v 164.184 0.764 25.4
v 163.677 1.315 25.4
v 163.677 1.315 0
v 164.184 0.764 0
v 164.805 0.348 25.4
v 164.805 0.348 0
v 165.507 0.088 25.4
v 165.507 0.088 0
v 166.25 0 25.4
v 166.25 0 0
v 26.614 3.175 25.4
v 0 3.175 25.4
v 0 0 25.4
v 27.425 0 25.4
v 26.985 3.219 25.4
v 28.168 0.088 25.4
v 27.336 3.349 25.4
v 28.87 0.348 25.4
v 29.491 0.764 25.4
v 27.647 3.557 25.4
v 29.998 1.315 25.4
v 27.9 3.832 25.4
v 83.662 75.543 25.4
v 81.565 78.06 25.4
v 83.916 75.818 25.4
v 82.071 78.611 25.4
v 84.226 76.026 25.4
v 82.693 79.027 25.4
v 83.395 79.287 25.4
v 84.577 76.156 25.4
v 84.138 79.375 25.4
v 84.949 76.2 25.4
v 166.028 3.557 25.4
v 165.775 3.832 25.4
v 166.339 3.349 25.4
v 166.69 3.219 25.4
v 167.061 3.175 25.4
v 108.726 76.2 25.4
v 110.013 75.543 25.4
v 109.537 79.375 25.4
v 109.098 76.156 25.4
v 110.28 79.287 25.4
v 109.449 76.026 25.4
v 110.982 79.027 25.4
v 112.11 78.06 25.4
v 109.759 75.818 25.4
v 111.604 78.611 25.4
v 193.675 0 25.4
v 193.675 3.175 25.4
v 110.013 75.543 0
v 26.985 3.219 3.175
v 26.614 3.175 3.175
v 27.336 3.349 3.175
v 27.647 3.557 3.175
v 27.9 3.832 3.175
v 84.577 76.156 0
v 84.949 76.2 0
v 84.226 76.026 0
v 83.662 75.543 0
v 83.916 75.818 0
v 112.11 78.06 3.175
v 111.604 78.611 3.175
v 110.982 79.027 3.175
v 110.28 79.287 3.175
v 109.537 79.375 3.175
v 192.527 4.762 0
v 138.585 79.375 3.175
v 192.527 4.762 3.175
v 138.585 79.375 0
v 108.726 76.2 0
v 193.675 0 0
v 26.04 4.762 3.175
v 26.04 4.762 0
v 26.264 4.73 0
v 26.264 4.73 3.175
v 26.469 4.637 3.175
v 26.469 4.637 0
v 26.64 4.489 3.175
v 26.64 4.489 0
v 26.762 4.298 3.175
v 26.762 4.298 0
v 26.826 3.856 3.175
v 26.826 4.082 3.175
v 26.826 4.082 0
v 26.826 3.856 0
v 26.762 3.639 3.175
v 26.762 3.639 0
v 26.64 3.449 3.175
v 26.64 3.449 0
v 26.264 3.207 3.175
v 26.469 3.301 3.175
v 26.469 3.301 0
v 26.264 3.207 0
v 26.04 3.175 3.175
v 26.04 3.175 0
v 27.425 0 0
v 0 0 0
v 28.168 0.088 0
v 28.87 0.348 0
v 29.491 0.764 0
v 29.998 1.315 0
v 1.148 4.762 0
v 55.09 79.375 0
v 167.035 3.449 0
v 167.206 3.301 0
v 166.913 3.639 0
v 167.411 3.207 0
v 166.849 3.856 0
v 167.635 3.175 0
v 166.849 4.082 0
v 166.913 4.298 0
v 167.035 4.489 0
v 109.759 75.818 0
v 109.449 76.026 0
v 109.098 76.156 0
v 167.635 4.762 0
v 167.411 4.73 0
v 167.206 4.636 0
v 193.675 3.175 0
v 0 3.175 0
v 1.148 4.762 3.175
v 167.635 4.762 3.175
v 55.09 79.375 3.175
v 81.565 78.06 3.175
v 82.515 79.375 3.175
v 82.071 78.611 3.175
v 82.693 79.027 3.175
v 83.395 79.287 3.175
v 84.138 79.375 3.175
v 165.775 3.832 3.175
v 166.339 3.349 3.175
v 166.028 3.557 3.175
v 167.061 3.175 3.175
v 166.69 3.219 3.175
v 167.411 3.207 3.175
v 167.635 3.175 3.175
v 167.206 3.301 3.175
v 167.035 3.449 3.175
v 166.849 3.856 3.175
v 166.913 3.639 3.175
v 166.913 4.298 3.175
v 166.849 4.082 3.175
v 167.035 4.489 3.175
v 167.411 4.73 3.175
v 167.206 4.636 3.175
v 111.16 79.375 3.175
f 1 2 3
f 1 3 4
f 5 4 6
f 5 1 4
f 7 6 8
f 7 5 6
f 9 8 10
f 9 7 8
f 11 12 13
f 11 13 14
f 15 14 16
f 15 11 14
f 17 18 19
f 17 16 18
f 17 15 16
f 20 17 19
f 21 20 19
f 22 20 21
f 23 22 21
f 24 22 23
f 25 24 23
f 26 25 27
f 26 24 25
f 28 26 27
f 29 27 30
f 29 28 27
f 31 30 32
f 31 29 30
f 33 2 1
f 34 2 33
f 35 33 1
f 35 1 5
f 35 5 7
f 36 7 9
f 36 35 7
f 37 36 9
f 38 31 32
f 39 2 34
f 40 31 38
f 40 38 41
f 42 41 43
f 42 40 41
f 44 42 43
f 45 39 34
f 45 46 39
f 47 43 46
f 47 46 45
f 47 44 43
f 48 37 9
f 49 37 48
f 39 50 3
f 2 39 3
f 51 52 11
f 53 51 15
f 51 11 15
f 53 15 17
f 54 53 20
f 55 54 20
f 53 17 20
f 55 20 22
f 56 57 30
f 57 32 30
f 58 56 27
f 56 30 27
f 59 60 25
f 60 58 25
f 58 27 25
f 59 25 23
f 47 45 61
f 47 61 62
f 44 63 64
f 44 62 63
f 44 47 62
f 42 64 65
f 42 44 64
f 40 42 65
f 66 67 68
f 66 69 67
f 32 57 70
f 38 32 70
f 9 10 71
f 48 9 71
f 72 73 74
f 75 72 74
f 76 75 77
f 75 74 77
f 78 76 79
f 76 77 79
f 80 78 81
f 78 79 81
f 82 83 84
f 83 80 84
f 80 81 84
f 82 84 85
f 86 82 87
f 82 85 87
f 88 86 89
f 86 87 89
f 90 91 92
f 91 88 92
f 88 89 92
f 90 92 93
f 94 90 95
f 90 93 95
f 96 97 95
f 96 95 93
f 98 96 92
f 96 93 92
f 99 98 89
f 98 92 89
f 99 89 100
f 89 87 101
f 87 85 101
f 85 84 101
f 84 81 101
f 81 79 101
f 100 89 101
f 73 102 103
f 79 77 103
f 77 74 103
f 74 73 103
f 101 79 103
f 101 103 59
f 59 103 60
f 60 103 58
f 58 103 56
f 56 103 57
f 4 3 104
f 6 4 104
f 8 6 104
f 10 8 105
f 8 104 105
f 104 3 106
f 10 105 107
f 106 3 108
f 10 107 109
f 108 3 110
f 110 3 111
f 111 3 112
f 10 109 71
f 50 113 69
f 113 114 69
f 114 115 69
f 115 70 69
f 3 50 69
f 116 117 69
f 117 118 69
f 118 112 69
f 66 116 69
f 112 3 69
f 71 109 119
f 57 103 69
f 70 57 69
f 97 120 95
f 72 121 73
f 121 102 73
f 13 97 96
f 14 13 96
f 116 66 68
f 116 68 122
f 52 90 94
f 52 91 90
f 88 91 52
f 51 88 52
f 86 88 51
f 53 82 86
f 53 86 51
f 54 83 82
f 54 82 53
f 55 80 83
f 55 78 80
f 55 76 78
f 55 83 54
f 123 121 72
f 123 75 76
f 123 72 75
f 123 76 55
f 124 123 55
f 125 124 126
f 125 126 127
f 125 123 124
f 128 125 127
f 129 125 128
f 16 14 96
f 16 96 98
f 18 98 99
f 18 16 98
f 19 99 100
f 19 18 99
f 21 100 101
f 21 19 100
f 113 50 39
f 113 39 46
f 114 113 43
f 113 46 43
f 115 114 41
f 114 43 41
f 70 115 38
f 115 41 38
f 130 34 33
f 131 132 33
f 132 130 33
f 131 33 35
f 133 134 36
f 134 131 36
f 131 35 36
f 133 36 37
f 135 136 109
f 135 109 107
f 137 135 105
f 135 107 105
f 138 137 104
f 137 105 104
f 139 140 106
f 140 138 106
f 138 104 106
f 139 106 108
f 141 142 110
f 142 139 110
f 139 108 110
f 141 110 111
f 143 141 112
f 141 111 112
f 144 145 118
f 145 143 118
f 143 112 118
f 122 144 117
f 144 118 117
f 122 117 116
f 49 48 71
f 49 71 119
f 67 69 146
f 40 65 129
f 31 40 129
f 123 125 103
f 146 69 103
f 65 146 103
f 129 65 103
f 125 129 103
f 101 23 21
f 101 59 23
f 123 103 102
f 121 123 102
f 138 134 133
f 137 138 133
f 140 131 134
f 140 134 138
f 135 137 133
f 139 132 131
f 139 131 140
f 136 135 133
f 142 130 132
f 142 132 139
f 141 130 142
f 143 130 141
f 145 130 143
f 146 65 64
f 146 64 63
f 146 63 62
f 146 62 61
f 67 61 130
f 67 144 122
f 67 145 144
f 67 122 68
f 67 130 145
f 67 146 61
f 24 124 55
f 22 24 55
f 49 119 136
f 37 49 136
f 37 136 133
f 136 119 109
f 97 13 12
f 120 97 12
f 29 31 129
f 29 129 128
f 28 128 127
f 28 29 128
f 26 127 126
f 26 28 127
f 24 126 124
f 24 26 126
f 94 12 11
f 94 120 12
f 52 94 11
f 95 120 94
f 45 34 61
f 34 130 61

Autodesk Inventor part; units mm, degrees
ref_plane "YZ Plane" through (0, 0, 0) normal (1, 0, 0) x (0, 1, 0)
ref_plane "XZ Plane" through (0, 0, 0) normal (0, 1, 0) x (-1, 0, 0)
ref_plane "XY Plane" through (0, 0, 0) normal (0, 0, 1) x (1, 0, 0)
sketch "Sketch1" plane through (0, 0, 0) normal (0, 0, 1) x (1, 0, 0)
  line L0 (0, 0) -> (193.675, 0)
  line L1 (84.1375, 76.2) -> (109.5375, 76.2)
  line L2 (84.1375, 76.2) -> (29.0474, 0)
  line L3 (109.5375, 76.2) -> (164.6276, 0)
  line L4 (55.0901, 79.375) -> (1.1477, 4.7625)
  line L5 (138.5849, 79.375) -> (192.5273, 4.7625)
  line L6 (0, 0) -> (0, 3.175)
  line L7 (0, 3.175) -> (27.425, 3.175)
  line L8 (193.675, 0) -> (193.675, 3.175)
  line L9 (193.675, 3.175) -> (166.25, 3.175)
  line L10 (166.25, 3.175) -> (111.1599, 79.375)
  line L11 (111.1599, 79.375) -> (82.5151, 79.375)
  line L12 (82.5151, 79.375) -> (27.425, 3.175)
  line L13 (55.0901, 79.375) -> (82.5151, 79.375)
  line L14 (111.1599, 79.375) -> (138.5849, 79.375)
  line L15 (1.1477, 4.7625) -> (26.0399, 4.7625)
  line L16 (192.5273, 4.7625) -> (167.6351, 4.7625)
  arc A0 (26.0399, 3.175) -> (26.0399, 4.7625) centre (26.0399, 3.9688) ccw
  arc A1 (167.6351, 4.7625) -> (167.6351, 3.175) centre (167.6351, 3.9688) ccw
  dimension "d0" = 193.675
  dimension "d1" = 25.4
  dimension "d2" = 25.4
  dimension "d3" = 25.4
  dimension "d4" = 3.175
  dimension "d5" = 3.175
  dimension "d6" = 76.2
  dimension "d7" = 1.5875
  dimension "d8" = 1.5875
  dimension "d9" = 1.5875
extrude "Extrusion1" add sketch "Sketch1" along normal blind 25.4 contours L6 L7 L12 L11 L10 L9 L8 L0 L3 L1 L2
extrude "Extrusion2" add sketch "Sketch1" along normal blind 3.175 contours A0 L15 L4 L13 L12 L7 | L9 L10 L14 L5 L16 A1
fillet "Fillet1" radius 1.5875 4 edges at (166.25, 3.175, 14.2875) (27.425, 3.175, 14.2875) (84.1375, 76.2, 12.7) (109.5375, 76.2, 12.7)
fillet "Fillet2" radius 3.175 4 edges at (82.5151, 79.375, 14.2875) (111.1599, 79.375, 14.2875) (29.0474, 0, 12.7) (164.6276, 0, 12.7)
equation "\"d5\" = d4"
equation "\"d7\" = 0.5 * d4"
equation "\"d9\" = d8"
properties part number "bunny throw base 1"
